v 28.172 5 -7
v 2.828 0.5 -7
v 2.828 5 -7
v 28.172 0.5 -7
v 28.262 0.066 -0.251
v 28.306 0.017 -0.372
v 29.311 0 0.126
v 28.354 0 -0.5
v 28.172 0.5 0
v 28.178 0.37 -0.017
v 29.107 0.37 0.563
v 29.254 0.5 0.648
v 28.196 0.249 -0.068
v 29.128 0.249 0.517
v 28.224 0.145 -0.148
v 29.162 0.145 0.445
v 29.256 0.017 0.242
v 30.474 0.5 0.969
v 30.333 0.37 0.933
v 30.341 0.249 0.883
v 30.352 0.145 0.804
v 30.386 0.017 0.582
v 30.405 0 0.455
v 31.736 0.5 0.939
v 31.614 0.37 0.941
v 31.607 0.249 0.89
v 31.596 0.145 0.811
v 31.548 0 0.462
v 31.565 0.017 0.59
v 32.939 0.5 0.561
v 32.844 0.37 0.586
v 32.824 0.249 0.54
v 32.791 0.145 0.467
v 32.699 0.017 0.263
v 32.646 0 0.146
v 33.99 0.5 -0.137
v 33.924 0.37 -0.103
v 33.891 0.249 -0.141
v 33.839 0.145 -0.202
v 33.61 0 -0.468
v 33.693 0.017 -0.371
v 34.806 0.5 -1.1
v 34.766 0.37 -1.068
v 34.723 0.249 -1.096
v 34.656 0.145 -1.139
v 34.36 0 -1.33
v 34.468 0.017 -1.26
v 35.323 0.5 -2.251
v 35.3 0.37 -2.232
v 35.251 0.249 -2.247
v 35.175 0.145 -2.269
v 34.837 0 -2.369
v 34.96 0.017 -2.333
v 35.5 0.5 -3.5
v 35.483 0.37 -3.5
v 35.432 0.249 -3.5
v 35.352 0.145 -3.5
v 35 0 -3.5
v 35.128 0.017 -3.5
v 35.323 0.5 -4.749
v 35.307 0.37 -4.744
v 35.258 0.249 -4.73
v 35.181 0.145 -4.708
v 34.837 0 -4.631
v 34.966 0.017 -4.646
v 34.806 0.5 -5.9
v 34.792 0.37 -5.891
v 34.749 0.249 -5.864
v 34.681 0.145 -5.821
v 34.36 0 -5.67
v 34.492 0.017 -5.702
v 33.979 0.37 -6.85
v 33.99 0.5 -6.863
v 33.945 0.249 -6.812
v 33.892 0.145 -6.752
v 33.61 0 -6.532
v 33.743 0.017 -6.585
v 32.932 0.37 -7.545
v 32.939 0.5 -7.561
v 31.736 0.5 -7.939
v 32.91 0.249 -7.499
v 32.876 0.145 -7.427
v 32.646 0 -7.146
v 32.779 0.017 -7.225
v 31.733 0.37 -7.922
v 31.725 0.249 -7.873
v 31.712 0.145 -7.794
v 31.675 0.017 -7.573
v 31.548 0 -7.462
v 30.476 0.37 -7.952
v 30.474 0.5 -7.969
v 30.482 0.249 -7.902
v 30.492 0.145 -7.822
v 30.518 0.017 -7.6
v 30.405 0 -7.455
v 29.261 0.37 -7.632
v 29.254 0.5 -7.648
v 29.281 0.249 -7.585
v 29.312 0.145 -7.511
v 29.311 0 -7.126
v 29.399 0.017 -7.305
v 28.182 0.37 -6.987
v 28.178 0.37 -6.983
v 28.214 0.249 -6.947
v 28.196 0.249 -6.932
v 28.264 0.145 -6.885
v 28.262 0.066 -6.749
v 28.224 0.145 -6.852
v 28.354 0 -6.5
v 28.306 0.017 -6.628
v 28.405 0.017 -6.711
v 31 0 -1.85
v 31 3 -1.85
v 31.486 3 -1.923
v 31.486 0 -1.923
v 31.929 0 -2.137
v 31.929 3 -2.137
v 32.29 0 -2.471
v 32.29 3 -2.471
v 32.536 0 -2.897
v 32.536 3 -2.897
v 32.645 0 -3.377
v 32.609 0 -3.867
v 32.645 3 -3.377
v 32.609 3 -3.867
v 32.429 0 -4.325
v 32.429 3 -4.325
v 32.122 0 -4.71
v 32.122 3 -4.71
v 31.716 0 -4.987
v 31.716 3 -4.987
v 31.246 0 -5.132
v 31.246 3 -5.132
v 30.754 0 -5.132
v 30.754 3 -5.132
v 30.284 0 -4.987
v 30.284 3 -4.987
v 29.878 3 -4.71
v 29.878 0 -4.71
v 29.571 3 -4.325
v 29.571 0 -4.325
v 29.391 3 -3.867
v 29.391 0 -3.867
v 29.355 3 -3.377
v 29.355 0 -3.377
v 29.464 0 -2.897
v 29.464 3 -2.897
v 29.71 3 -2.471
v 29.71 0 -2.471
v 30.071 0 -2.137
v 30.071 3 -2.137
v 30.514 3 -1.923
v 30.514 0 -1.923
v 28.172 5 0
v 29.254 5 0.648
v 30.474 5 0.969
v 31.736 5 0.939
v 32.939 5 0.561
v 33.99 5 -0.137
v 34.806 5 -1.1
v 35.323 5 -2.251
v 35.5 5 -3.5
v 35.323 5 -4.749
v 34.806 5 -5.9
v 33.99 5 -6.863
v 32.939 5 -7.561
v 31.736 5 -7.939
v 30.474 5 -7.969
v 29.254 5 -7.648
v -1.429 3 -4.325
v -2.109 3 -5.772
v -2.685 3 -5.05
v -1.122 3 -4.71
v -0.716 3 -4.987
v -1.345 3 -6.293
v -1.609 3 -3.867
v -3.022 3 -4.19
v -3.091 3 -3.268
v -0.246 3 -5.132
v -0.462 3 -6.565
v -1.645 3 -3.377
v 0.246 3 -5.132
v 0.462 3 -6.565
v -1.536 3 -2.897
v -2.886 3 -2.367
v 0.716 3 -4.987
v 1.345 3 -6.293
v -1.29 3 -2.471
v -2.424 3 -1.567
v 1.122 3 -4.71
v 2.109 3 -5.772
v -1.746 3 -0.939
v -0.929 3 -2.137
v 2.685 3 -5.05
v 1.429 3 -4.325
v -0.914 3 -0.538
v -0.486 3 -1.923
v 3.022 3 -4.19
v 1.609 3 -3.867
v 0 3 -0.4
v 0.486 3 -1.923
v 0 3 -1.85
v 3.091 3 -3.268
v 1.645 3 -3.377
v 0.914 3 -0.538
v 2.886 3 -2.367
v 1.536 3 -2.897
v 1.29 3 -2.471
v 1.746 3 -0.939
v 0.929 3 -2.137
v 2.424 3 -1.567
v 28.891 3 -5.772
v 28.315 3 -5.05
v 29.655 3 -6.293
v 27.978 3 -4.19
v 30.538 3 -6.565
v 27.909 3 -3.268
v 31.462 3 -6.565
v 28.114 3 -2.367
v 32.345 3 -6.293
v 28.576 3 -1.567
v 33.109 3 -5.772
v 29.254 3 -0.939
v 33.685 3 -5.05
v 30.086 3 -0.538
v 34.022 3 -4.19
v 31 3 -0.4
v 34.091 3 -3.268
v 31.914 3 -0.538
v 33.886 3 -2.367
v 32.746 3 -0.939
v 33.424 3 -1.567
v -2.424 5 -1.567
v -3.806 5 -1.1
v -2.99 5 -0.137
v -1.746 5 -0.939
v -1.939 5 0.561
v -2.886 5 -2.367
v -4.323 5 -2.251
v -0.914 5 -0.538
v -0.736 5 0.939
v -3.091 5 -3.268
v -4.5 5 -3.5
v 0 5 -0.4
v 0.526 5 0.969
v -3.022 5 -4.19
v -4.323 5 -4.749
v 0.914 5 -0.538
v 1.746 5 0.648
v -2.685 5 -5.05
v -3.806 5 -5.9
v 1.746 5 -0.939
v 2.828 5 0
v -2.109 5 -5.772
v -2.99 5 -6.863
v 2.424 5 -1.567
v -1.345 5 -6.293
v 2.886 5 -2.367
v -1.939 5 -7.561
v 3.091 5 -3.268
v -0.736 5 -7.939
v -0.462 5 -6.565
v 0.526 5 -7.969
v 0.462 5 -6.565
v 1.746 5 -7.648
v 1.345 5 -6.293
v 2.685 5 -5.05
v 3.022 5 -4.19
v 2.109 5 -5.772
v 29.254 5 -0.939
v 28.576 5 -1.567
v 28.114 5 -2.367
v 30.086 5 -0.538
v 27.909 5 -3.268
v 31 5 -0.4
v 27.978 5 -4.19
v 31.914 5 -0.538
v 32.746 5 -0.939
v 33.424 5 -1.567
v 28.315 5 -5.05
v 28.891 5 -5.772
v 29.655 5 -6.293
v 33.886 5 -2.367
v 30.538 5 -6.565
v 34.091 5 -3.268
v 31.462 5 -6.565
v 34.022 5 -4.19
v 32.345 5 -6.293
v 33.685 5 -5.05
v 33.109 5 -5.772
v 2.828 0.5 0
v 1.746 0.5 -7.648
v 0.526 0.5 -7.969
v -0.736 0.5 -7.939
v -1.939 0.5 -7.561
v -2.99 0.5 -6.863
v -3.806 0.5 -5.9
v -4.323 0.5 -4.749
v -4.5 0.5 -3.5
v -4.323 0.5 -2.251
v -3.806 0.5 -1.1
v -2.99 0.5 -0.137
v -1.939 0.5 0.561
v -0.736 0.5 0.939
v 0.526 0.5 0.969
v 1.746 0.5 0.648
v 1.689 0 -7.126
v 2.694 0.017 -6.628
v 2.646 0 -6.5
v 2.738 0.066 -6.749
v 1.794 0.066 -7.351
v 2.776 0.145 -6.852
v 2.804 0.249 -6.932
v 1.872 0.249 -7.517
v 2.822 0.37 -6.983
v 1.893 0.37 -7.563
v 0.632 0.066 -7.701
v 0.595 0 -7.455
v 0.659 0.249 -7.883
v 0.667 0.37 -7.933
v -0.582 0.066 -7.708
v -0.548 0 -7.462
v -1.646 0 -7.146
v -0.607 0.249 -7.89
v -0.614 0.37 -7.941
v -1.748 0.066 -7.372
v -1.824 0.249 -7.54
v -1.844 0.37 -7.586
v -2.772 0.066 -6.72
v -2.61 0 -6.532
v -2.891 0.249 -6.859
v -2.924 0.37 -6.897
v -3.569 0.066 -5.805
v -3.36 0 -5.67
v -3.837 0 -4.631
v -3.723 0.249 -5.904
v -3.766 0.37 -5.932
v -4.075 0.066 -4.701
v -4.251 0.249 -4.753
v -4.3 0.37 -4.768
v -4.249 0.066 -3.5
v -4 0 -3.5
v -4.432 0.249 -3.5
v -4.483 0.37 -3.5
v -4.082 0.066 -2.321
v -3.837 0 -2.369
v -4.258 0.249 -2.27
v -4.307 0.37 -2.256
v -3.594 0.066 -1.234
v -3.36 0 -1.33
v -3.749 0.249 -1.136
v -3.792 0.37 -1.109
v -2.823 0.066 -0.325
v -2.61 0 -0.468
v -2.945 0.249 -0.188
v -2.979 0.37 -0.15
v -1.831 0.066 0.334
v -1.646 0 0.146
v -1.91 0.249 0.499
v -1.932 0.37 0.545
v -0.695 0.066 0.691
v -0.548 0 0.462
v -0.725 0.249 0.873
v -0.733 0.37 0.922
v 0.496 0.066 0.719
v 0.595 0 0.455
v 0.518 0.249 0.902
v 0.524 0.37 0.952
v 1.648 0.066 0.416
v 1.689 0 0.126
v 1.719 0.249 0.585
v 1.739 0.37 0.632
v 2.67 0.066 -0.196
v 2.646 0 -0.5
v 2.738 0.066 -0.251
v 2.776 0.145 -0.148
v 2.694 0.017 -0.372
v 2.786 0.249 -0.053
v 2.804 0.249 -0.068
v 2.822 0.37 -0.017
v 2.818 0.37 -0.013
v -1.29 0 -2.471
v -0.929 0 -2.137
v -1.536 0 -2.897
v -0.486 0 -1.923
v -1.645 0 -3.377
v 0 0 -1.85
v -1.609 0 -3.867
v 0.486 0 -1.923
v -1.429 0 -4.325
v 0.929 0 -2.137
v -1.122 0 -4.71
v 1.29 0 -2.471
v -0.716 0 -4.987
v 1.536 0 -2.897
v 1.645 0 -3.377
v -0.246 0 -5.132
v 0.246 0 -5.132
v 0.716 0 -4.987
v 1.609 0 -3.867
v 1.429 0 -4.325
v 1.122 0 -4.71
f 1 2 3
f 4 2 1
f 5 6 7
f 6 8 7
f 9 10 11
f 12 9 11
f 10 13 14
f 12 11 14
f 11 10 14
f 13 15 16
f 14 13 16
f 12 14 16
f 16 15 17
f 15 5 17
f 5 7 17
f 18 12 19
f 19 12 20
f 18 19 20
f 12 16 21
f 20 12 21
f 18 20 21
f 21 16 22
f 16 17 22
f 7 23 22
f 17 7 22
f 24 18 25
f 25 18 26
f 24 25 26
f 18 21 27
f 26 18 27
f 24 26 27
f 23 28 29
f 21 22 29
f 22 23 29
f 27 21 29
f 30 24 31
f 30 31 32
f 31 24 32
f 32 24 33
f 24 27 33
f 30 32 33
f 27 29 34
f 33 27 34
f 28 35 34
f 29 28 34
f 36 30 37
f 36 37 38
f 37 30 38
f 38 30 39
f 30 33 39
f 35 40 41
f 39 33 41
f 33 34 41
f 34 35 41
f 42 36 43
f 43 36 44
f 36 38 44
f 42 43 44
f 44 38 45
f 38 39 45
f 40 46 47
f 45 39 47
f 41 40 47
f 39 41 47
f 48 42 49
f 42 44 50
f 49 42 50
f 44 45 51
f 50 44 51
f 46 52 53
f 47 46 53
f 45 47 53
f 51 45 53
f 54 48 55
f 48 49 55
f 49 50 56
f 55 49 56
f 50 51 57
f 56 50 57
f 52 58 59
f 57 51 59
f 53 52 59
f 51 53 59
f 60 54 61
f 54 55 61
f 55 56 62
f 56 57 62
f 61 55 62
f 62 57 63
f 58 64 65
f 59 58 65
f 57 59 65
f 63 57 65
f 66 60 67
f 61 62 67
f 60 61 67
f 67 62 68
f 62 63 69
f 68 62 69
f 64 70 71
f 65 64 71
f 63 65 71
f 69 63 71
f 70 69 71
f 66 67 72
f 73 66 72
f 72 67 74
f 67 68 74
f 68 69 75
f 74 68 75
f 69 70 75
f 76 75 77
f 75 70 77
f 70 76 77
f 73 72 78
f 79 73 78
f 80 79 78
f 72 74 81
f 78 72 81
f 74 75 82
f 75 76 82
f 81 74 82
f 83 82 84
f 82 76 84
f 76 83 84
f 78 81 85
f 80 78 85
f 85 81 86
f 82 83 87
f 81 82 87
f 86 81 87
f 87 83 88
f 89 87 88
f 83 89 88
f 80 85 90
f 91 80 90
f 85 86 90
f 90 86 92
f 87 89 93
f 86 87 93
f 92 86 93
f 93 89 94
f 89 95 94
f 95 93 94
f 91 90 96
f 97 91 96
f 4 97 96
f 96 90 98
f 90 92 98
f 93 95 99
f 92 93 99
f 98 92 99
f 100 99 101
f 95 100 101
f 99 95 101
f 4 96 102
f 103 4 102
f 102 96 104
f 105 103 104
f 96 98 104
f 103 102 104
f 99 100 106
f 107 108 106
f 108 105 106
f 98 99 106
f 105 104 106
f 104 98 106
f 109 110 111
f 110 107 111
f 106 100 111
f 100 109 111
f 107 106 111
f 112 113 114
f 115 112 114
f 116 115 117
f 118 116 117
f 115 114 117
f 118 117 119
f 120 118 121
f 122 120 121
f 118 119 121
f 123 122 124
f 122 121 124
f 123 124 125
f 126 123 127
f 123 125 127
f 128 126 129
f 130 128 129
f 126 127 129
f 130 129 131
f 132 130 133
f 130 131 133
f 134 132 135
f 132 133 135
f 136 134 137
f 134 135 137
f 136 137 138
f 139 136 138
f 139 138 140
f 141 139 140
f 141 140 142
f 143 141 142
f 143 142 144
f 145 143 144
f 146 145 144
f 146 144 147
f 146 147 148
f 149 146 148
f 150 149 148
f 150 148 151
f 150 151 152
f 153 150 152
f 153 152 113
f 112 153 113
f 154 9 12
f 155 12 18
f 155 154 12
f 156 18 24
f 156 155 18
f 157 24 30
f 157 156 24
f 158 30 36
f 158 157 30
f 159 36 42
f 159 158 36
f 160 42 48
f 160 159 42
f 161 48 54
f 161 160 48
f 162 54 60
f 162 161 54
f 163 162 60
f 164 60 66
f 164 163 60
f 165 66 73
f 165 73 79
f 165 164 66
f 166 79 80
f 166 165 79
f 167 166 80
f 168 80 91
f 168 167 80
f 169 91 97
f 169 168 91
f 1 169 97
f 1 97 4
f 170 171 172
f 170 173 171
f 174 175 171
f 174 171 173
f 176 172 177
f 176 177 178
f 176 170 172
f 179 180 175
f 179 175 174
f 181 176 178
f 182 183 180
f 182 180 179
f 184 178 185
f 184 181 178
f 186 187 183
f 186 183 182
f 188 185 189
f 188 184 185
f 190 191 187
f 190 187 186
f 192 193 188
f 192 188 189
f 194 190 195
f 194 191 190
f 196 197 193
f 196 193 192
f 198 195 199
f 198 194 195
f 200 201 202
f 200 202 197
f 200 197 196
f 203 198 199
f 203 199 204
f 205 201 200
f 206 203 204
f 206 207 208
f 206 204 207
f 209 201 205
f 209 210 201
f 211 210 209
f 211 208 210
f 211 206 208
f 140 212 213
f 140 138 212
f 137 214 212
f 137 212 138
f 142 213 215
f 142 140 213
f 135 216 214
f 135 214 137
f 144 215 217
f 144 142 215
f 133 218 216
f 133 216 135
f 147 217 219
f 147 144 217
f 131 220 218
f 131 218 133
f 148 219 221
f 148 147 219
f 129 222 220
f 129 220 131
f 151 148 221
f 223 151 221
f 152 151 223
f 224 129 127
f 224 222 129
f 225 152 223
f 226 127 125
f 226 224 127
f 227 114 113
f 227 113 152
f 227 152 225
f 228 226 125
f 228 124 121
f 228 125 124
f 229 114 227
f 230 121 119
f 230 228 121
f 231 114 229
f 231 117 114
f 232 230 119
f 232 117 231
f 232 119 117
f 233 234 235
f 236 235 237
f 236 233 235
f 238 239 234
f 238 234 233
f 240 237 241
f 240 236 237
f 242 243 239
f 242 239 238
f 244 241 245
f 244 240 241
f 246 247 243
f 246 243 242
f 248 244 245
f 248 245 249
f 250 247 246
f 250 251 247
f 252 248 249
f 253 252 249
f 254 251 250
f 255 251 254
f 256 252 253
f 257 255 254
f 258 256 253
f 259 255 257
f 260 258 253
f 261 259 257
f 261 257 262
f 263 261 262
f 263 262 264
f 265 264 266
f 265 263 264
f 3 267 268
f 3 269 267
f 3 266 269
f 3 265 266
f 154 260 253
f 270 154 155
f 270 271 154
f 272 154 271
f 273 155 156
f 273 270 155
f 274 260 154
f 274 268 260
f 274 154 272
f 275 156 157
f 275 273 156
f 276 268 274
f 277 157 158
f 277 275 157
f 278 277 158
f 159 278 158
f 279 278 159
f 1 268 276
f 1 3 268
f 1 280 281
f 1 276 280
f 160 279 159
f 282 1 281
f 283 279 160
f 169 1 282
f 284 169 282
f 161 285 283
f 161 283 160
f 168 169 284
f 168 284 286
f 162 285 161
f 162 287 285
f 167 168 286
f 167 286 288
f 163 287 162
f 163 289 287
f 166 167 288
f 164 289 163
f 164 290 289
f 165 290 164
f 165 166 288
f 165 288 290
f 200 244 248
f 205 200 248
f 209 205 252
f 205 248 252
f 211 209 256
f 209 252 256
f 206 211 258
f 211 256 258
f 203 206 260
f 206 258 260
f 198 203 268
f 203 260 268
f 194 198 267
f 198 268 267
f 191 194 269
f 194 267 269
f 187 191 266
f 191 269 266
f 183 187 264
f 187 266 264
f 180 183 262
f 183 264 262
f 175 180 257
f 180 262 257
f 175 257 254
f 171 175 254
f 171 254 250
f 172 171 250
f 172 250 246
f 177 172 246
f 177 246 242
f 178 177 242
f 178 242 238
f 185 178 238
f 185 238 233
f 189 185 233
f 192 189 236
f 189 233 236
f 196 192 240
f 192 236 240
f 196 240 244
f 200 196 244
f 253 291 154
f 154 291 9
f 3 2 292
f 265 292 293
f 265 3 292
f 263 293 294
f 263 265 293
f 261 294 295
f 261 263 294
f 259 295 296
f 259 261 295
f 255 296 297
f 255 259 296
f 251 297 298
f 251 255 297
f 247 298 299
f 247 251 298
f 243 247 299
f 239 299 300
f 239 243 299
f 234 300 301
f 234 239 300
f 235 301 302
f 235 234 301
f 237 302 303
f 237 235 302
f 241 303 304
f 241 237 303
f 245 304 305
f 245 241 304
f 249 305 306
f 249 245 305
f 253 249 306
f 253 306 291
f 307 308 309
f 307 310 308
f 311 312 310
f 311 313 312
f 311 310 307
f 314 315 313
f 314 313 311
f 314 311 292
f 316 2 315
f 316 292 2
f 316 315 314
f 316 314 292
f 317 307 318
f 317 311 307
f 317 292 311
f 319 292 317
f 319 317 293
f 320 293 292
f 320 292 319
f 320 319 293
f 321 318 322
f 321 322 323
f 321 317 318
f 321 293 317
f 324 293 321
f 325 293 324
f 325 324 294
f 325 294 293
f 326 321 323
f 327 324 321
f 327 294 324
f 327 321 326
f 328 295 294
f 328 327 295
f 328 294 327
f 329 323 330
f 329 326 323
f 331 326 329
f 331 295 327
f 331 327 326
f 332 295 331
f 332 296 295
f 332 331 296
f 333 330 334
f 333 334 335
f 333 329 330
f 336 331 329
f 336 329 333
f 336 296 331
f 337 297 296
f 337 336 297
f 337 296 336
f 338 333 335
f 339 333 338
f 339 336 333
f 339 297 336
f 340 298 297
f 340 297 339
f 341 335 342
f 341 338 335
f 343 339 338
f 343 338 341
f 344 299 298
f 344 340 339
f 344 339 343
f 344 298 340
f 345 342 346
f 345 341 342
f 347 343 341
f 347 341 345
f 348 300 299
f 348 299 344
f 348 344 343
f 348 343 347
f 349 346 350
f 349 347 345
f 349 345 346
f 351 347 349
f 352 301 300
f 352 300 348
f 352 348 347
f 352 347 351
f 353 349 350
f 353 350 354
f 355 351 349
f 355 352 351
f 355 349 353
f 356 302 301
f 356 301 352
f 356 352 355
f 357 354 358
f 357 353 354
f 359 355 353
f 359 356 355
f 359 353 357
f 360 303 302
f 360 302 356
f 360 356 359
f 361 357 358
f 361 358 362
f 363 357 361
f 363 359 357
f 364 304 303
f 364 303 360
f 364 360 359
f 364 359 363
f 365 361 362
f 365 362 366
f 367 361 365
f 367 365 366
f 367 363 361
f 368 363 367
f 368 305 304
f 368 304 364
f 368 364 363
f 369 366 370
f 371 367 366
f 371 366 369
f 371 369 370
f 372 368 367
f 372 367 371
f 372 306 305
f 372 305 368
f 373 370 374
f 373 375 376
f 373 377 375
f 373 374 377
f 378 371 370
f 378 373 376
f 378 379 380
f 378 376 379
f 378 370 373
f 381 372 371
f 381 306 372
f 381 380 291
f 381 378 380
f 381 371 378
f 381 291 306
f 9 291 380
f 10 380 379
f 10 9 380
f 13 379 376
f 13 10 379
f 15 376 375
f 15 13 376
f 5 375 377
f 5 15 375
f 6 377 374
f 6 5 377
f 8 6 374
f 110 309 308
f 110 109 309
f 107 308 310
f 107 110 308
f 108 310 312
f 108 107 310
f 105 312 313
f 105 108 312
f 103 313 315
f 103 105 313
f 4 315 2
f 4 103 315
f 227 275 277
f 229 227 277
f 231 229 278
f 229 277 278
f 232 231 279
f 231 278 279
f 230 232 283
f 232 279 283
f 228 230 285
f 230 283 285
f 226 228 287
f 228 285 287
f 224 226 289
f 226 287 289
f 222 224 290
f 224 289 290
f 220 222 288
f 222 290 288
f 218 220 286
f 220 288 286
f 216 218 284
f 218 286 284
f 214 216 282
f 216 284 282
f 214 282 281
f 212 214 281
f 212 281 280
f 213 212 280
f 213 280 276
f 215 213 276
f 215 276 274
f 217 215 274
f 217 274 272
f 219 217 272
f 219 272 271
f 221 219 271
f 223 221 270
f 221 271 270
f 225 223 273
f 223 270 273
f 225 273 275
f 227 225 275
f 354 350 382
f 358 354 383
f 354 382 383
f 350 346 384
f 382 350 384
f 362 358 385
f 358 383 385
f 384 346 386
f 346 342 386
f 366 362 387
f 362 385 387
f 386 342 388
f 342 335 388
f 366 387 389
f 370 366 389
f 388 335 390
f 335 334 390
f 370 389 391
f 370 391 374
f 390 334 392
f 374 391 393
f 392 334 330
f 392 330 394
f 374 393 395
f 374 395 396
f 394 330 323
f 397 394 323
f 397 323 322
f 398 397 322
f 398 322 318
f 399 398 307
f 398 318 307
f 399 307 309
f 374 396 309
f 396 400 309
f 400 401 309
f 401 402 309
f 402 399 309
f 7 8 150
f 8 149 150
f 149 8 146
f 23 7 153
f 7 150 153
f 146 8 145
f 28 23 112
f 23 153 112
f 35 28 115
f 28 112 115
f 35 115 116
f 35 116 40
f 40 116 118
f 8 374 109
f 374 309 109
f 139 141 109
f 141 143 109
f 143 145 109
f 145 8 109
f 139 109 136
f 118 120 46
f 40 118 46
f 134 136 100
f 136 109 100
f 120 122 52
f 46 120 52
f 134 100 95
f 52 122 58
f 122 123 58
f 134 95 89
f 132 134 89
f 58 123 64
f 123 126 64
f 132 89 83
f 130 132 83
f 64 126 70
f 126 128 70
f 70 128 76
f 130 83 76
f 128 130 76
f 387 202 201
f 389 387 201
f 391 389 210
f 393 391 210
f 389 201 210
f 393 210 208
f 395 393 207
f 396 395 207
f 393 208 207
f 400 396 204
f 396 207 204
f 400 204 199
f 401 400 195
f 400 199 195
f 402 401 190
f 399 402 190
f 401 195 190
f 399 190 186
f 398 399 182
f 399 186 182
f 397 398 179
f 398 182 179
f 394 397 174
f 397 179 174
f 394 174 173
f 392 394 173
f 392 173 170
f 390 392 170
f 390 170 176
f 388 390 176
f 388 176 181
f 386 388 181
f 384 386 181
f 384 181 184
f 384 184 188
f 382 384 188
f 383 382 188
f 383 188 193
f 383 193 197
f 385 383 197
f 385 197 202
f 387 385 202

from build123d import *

# Parameters (mm, degrees)
SKETCH1_W           = 31
SKETCH1_H           = 7
BOSS_EXTRUDE1_DEPTH = 5
SKETCH2_R           = 4.5
BOSS_EXTRUDE2_DEPTH = 5
SKETCH3_R           = 1.65
CUT_EXTRUDE1_DEPTH  = 37.732138517
SKETCH4_R           = 3.1
CUT_EXTRUDE2_DEPTH  = 2
FILLET1_R           = 0.5


with BuildPart() as part:
    # Sketch1 → Boss-Extrude1 (new body)
    with BuildSketch(Plane(origin=(0, 0, 0), x_dir=(1, 0, 0), z_dir=(0, 1, 0))):
        with Locations((15.5, 3.5)):
            Rectangle(SKETCH1_W, SKETCH1_H)
    extrude(amount=BOSS_EXTRUDE1_DEPTH)

    # Sketch2 → Boss-Extrude2 (add)
    with BuildSketch(Plane(origin=(0, 5, 0), x_dir=(1, 0, 0), z_dir=(0, 1, 0))):
        with Locations((31, 3.5)):
            Circle(SKETCH2_R)
        with Locations((0, 3.5)):
            Circle(SKETCH2_R)
    extrude(amount=-BOSS_EXTRUDE2_DEPTH)

    # Sketch3 → Cut-Extrude1 (cut, through all)
    with BuildSketch(Plane(origin=(0, 5, 0), x_dir=(1, 0, 0), z_dir=(0, 1, 0))):
        with Locations(Location((0, 3.5, 0), (0, 0, 270))):
            Circle(SKETCH3_R)
        with Locations(Location((31, 3.5, 0), (0, 0, 270))):
            Circle(SKETCH3_R)
    extrude(amount=-CUT_EXTRUDE1_DEPTH, mode=Mode.SUBTRACT)

    # Sketch4 → Cut-Extrude2 (cut)
    with BuildSketch(Plane(origin=(0, 5, 0), x_dir=(1, 0, 0), z_dir=(0, 1, 0))):
        with Locations(Location((0, 3.5, 0), (0, 0, 270))):
            Circle(SKETCH4_R)
        with Locations(Location((31, 3.5, 0), (0, 0, 270))):
            Circle(SKETCH4_R)
    extrude(amount=-CUT_EXTRUDE2_DEPTH, mode=Mode.SUBTRACT)

    # Fillet1
    fillet1_edges = [part.edges().sort_by_distance(p)[0] for p in [
        (15.5, 0, -7),
        (35.5, 0, -3.5),
        (15.5, 0, 0),
        (-4.5, 0, -3.5),
    ]]
    fillet(fillet1_edges, radius=FILLET1_R)


solid = part.part
